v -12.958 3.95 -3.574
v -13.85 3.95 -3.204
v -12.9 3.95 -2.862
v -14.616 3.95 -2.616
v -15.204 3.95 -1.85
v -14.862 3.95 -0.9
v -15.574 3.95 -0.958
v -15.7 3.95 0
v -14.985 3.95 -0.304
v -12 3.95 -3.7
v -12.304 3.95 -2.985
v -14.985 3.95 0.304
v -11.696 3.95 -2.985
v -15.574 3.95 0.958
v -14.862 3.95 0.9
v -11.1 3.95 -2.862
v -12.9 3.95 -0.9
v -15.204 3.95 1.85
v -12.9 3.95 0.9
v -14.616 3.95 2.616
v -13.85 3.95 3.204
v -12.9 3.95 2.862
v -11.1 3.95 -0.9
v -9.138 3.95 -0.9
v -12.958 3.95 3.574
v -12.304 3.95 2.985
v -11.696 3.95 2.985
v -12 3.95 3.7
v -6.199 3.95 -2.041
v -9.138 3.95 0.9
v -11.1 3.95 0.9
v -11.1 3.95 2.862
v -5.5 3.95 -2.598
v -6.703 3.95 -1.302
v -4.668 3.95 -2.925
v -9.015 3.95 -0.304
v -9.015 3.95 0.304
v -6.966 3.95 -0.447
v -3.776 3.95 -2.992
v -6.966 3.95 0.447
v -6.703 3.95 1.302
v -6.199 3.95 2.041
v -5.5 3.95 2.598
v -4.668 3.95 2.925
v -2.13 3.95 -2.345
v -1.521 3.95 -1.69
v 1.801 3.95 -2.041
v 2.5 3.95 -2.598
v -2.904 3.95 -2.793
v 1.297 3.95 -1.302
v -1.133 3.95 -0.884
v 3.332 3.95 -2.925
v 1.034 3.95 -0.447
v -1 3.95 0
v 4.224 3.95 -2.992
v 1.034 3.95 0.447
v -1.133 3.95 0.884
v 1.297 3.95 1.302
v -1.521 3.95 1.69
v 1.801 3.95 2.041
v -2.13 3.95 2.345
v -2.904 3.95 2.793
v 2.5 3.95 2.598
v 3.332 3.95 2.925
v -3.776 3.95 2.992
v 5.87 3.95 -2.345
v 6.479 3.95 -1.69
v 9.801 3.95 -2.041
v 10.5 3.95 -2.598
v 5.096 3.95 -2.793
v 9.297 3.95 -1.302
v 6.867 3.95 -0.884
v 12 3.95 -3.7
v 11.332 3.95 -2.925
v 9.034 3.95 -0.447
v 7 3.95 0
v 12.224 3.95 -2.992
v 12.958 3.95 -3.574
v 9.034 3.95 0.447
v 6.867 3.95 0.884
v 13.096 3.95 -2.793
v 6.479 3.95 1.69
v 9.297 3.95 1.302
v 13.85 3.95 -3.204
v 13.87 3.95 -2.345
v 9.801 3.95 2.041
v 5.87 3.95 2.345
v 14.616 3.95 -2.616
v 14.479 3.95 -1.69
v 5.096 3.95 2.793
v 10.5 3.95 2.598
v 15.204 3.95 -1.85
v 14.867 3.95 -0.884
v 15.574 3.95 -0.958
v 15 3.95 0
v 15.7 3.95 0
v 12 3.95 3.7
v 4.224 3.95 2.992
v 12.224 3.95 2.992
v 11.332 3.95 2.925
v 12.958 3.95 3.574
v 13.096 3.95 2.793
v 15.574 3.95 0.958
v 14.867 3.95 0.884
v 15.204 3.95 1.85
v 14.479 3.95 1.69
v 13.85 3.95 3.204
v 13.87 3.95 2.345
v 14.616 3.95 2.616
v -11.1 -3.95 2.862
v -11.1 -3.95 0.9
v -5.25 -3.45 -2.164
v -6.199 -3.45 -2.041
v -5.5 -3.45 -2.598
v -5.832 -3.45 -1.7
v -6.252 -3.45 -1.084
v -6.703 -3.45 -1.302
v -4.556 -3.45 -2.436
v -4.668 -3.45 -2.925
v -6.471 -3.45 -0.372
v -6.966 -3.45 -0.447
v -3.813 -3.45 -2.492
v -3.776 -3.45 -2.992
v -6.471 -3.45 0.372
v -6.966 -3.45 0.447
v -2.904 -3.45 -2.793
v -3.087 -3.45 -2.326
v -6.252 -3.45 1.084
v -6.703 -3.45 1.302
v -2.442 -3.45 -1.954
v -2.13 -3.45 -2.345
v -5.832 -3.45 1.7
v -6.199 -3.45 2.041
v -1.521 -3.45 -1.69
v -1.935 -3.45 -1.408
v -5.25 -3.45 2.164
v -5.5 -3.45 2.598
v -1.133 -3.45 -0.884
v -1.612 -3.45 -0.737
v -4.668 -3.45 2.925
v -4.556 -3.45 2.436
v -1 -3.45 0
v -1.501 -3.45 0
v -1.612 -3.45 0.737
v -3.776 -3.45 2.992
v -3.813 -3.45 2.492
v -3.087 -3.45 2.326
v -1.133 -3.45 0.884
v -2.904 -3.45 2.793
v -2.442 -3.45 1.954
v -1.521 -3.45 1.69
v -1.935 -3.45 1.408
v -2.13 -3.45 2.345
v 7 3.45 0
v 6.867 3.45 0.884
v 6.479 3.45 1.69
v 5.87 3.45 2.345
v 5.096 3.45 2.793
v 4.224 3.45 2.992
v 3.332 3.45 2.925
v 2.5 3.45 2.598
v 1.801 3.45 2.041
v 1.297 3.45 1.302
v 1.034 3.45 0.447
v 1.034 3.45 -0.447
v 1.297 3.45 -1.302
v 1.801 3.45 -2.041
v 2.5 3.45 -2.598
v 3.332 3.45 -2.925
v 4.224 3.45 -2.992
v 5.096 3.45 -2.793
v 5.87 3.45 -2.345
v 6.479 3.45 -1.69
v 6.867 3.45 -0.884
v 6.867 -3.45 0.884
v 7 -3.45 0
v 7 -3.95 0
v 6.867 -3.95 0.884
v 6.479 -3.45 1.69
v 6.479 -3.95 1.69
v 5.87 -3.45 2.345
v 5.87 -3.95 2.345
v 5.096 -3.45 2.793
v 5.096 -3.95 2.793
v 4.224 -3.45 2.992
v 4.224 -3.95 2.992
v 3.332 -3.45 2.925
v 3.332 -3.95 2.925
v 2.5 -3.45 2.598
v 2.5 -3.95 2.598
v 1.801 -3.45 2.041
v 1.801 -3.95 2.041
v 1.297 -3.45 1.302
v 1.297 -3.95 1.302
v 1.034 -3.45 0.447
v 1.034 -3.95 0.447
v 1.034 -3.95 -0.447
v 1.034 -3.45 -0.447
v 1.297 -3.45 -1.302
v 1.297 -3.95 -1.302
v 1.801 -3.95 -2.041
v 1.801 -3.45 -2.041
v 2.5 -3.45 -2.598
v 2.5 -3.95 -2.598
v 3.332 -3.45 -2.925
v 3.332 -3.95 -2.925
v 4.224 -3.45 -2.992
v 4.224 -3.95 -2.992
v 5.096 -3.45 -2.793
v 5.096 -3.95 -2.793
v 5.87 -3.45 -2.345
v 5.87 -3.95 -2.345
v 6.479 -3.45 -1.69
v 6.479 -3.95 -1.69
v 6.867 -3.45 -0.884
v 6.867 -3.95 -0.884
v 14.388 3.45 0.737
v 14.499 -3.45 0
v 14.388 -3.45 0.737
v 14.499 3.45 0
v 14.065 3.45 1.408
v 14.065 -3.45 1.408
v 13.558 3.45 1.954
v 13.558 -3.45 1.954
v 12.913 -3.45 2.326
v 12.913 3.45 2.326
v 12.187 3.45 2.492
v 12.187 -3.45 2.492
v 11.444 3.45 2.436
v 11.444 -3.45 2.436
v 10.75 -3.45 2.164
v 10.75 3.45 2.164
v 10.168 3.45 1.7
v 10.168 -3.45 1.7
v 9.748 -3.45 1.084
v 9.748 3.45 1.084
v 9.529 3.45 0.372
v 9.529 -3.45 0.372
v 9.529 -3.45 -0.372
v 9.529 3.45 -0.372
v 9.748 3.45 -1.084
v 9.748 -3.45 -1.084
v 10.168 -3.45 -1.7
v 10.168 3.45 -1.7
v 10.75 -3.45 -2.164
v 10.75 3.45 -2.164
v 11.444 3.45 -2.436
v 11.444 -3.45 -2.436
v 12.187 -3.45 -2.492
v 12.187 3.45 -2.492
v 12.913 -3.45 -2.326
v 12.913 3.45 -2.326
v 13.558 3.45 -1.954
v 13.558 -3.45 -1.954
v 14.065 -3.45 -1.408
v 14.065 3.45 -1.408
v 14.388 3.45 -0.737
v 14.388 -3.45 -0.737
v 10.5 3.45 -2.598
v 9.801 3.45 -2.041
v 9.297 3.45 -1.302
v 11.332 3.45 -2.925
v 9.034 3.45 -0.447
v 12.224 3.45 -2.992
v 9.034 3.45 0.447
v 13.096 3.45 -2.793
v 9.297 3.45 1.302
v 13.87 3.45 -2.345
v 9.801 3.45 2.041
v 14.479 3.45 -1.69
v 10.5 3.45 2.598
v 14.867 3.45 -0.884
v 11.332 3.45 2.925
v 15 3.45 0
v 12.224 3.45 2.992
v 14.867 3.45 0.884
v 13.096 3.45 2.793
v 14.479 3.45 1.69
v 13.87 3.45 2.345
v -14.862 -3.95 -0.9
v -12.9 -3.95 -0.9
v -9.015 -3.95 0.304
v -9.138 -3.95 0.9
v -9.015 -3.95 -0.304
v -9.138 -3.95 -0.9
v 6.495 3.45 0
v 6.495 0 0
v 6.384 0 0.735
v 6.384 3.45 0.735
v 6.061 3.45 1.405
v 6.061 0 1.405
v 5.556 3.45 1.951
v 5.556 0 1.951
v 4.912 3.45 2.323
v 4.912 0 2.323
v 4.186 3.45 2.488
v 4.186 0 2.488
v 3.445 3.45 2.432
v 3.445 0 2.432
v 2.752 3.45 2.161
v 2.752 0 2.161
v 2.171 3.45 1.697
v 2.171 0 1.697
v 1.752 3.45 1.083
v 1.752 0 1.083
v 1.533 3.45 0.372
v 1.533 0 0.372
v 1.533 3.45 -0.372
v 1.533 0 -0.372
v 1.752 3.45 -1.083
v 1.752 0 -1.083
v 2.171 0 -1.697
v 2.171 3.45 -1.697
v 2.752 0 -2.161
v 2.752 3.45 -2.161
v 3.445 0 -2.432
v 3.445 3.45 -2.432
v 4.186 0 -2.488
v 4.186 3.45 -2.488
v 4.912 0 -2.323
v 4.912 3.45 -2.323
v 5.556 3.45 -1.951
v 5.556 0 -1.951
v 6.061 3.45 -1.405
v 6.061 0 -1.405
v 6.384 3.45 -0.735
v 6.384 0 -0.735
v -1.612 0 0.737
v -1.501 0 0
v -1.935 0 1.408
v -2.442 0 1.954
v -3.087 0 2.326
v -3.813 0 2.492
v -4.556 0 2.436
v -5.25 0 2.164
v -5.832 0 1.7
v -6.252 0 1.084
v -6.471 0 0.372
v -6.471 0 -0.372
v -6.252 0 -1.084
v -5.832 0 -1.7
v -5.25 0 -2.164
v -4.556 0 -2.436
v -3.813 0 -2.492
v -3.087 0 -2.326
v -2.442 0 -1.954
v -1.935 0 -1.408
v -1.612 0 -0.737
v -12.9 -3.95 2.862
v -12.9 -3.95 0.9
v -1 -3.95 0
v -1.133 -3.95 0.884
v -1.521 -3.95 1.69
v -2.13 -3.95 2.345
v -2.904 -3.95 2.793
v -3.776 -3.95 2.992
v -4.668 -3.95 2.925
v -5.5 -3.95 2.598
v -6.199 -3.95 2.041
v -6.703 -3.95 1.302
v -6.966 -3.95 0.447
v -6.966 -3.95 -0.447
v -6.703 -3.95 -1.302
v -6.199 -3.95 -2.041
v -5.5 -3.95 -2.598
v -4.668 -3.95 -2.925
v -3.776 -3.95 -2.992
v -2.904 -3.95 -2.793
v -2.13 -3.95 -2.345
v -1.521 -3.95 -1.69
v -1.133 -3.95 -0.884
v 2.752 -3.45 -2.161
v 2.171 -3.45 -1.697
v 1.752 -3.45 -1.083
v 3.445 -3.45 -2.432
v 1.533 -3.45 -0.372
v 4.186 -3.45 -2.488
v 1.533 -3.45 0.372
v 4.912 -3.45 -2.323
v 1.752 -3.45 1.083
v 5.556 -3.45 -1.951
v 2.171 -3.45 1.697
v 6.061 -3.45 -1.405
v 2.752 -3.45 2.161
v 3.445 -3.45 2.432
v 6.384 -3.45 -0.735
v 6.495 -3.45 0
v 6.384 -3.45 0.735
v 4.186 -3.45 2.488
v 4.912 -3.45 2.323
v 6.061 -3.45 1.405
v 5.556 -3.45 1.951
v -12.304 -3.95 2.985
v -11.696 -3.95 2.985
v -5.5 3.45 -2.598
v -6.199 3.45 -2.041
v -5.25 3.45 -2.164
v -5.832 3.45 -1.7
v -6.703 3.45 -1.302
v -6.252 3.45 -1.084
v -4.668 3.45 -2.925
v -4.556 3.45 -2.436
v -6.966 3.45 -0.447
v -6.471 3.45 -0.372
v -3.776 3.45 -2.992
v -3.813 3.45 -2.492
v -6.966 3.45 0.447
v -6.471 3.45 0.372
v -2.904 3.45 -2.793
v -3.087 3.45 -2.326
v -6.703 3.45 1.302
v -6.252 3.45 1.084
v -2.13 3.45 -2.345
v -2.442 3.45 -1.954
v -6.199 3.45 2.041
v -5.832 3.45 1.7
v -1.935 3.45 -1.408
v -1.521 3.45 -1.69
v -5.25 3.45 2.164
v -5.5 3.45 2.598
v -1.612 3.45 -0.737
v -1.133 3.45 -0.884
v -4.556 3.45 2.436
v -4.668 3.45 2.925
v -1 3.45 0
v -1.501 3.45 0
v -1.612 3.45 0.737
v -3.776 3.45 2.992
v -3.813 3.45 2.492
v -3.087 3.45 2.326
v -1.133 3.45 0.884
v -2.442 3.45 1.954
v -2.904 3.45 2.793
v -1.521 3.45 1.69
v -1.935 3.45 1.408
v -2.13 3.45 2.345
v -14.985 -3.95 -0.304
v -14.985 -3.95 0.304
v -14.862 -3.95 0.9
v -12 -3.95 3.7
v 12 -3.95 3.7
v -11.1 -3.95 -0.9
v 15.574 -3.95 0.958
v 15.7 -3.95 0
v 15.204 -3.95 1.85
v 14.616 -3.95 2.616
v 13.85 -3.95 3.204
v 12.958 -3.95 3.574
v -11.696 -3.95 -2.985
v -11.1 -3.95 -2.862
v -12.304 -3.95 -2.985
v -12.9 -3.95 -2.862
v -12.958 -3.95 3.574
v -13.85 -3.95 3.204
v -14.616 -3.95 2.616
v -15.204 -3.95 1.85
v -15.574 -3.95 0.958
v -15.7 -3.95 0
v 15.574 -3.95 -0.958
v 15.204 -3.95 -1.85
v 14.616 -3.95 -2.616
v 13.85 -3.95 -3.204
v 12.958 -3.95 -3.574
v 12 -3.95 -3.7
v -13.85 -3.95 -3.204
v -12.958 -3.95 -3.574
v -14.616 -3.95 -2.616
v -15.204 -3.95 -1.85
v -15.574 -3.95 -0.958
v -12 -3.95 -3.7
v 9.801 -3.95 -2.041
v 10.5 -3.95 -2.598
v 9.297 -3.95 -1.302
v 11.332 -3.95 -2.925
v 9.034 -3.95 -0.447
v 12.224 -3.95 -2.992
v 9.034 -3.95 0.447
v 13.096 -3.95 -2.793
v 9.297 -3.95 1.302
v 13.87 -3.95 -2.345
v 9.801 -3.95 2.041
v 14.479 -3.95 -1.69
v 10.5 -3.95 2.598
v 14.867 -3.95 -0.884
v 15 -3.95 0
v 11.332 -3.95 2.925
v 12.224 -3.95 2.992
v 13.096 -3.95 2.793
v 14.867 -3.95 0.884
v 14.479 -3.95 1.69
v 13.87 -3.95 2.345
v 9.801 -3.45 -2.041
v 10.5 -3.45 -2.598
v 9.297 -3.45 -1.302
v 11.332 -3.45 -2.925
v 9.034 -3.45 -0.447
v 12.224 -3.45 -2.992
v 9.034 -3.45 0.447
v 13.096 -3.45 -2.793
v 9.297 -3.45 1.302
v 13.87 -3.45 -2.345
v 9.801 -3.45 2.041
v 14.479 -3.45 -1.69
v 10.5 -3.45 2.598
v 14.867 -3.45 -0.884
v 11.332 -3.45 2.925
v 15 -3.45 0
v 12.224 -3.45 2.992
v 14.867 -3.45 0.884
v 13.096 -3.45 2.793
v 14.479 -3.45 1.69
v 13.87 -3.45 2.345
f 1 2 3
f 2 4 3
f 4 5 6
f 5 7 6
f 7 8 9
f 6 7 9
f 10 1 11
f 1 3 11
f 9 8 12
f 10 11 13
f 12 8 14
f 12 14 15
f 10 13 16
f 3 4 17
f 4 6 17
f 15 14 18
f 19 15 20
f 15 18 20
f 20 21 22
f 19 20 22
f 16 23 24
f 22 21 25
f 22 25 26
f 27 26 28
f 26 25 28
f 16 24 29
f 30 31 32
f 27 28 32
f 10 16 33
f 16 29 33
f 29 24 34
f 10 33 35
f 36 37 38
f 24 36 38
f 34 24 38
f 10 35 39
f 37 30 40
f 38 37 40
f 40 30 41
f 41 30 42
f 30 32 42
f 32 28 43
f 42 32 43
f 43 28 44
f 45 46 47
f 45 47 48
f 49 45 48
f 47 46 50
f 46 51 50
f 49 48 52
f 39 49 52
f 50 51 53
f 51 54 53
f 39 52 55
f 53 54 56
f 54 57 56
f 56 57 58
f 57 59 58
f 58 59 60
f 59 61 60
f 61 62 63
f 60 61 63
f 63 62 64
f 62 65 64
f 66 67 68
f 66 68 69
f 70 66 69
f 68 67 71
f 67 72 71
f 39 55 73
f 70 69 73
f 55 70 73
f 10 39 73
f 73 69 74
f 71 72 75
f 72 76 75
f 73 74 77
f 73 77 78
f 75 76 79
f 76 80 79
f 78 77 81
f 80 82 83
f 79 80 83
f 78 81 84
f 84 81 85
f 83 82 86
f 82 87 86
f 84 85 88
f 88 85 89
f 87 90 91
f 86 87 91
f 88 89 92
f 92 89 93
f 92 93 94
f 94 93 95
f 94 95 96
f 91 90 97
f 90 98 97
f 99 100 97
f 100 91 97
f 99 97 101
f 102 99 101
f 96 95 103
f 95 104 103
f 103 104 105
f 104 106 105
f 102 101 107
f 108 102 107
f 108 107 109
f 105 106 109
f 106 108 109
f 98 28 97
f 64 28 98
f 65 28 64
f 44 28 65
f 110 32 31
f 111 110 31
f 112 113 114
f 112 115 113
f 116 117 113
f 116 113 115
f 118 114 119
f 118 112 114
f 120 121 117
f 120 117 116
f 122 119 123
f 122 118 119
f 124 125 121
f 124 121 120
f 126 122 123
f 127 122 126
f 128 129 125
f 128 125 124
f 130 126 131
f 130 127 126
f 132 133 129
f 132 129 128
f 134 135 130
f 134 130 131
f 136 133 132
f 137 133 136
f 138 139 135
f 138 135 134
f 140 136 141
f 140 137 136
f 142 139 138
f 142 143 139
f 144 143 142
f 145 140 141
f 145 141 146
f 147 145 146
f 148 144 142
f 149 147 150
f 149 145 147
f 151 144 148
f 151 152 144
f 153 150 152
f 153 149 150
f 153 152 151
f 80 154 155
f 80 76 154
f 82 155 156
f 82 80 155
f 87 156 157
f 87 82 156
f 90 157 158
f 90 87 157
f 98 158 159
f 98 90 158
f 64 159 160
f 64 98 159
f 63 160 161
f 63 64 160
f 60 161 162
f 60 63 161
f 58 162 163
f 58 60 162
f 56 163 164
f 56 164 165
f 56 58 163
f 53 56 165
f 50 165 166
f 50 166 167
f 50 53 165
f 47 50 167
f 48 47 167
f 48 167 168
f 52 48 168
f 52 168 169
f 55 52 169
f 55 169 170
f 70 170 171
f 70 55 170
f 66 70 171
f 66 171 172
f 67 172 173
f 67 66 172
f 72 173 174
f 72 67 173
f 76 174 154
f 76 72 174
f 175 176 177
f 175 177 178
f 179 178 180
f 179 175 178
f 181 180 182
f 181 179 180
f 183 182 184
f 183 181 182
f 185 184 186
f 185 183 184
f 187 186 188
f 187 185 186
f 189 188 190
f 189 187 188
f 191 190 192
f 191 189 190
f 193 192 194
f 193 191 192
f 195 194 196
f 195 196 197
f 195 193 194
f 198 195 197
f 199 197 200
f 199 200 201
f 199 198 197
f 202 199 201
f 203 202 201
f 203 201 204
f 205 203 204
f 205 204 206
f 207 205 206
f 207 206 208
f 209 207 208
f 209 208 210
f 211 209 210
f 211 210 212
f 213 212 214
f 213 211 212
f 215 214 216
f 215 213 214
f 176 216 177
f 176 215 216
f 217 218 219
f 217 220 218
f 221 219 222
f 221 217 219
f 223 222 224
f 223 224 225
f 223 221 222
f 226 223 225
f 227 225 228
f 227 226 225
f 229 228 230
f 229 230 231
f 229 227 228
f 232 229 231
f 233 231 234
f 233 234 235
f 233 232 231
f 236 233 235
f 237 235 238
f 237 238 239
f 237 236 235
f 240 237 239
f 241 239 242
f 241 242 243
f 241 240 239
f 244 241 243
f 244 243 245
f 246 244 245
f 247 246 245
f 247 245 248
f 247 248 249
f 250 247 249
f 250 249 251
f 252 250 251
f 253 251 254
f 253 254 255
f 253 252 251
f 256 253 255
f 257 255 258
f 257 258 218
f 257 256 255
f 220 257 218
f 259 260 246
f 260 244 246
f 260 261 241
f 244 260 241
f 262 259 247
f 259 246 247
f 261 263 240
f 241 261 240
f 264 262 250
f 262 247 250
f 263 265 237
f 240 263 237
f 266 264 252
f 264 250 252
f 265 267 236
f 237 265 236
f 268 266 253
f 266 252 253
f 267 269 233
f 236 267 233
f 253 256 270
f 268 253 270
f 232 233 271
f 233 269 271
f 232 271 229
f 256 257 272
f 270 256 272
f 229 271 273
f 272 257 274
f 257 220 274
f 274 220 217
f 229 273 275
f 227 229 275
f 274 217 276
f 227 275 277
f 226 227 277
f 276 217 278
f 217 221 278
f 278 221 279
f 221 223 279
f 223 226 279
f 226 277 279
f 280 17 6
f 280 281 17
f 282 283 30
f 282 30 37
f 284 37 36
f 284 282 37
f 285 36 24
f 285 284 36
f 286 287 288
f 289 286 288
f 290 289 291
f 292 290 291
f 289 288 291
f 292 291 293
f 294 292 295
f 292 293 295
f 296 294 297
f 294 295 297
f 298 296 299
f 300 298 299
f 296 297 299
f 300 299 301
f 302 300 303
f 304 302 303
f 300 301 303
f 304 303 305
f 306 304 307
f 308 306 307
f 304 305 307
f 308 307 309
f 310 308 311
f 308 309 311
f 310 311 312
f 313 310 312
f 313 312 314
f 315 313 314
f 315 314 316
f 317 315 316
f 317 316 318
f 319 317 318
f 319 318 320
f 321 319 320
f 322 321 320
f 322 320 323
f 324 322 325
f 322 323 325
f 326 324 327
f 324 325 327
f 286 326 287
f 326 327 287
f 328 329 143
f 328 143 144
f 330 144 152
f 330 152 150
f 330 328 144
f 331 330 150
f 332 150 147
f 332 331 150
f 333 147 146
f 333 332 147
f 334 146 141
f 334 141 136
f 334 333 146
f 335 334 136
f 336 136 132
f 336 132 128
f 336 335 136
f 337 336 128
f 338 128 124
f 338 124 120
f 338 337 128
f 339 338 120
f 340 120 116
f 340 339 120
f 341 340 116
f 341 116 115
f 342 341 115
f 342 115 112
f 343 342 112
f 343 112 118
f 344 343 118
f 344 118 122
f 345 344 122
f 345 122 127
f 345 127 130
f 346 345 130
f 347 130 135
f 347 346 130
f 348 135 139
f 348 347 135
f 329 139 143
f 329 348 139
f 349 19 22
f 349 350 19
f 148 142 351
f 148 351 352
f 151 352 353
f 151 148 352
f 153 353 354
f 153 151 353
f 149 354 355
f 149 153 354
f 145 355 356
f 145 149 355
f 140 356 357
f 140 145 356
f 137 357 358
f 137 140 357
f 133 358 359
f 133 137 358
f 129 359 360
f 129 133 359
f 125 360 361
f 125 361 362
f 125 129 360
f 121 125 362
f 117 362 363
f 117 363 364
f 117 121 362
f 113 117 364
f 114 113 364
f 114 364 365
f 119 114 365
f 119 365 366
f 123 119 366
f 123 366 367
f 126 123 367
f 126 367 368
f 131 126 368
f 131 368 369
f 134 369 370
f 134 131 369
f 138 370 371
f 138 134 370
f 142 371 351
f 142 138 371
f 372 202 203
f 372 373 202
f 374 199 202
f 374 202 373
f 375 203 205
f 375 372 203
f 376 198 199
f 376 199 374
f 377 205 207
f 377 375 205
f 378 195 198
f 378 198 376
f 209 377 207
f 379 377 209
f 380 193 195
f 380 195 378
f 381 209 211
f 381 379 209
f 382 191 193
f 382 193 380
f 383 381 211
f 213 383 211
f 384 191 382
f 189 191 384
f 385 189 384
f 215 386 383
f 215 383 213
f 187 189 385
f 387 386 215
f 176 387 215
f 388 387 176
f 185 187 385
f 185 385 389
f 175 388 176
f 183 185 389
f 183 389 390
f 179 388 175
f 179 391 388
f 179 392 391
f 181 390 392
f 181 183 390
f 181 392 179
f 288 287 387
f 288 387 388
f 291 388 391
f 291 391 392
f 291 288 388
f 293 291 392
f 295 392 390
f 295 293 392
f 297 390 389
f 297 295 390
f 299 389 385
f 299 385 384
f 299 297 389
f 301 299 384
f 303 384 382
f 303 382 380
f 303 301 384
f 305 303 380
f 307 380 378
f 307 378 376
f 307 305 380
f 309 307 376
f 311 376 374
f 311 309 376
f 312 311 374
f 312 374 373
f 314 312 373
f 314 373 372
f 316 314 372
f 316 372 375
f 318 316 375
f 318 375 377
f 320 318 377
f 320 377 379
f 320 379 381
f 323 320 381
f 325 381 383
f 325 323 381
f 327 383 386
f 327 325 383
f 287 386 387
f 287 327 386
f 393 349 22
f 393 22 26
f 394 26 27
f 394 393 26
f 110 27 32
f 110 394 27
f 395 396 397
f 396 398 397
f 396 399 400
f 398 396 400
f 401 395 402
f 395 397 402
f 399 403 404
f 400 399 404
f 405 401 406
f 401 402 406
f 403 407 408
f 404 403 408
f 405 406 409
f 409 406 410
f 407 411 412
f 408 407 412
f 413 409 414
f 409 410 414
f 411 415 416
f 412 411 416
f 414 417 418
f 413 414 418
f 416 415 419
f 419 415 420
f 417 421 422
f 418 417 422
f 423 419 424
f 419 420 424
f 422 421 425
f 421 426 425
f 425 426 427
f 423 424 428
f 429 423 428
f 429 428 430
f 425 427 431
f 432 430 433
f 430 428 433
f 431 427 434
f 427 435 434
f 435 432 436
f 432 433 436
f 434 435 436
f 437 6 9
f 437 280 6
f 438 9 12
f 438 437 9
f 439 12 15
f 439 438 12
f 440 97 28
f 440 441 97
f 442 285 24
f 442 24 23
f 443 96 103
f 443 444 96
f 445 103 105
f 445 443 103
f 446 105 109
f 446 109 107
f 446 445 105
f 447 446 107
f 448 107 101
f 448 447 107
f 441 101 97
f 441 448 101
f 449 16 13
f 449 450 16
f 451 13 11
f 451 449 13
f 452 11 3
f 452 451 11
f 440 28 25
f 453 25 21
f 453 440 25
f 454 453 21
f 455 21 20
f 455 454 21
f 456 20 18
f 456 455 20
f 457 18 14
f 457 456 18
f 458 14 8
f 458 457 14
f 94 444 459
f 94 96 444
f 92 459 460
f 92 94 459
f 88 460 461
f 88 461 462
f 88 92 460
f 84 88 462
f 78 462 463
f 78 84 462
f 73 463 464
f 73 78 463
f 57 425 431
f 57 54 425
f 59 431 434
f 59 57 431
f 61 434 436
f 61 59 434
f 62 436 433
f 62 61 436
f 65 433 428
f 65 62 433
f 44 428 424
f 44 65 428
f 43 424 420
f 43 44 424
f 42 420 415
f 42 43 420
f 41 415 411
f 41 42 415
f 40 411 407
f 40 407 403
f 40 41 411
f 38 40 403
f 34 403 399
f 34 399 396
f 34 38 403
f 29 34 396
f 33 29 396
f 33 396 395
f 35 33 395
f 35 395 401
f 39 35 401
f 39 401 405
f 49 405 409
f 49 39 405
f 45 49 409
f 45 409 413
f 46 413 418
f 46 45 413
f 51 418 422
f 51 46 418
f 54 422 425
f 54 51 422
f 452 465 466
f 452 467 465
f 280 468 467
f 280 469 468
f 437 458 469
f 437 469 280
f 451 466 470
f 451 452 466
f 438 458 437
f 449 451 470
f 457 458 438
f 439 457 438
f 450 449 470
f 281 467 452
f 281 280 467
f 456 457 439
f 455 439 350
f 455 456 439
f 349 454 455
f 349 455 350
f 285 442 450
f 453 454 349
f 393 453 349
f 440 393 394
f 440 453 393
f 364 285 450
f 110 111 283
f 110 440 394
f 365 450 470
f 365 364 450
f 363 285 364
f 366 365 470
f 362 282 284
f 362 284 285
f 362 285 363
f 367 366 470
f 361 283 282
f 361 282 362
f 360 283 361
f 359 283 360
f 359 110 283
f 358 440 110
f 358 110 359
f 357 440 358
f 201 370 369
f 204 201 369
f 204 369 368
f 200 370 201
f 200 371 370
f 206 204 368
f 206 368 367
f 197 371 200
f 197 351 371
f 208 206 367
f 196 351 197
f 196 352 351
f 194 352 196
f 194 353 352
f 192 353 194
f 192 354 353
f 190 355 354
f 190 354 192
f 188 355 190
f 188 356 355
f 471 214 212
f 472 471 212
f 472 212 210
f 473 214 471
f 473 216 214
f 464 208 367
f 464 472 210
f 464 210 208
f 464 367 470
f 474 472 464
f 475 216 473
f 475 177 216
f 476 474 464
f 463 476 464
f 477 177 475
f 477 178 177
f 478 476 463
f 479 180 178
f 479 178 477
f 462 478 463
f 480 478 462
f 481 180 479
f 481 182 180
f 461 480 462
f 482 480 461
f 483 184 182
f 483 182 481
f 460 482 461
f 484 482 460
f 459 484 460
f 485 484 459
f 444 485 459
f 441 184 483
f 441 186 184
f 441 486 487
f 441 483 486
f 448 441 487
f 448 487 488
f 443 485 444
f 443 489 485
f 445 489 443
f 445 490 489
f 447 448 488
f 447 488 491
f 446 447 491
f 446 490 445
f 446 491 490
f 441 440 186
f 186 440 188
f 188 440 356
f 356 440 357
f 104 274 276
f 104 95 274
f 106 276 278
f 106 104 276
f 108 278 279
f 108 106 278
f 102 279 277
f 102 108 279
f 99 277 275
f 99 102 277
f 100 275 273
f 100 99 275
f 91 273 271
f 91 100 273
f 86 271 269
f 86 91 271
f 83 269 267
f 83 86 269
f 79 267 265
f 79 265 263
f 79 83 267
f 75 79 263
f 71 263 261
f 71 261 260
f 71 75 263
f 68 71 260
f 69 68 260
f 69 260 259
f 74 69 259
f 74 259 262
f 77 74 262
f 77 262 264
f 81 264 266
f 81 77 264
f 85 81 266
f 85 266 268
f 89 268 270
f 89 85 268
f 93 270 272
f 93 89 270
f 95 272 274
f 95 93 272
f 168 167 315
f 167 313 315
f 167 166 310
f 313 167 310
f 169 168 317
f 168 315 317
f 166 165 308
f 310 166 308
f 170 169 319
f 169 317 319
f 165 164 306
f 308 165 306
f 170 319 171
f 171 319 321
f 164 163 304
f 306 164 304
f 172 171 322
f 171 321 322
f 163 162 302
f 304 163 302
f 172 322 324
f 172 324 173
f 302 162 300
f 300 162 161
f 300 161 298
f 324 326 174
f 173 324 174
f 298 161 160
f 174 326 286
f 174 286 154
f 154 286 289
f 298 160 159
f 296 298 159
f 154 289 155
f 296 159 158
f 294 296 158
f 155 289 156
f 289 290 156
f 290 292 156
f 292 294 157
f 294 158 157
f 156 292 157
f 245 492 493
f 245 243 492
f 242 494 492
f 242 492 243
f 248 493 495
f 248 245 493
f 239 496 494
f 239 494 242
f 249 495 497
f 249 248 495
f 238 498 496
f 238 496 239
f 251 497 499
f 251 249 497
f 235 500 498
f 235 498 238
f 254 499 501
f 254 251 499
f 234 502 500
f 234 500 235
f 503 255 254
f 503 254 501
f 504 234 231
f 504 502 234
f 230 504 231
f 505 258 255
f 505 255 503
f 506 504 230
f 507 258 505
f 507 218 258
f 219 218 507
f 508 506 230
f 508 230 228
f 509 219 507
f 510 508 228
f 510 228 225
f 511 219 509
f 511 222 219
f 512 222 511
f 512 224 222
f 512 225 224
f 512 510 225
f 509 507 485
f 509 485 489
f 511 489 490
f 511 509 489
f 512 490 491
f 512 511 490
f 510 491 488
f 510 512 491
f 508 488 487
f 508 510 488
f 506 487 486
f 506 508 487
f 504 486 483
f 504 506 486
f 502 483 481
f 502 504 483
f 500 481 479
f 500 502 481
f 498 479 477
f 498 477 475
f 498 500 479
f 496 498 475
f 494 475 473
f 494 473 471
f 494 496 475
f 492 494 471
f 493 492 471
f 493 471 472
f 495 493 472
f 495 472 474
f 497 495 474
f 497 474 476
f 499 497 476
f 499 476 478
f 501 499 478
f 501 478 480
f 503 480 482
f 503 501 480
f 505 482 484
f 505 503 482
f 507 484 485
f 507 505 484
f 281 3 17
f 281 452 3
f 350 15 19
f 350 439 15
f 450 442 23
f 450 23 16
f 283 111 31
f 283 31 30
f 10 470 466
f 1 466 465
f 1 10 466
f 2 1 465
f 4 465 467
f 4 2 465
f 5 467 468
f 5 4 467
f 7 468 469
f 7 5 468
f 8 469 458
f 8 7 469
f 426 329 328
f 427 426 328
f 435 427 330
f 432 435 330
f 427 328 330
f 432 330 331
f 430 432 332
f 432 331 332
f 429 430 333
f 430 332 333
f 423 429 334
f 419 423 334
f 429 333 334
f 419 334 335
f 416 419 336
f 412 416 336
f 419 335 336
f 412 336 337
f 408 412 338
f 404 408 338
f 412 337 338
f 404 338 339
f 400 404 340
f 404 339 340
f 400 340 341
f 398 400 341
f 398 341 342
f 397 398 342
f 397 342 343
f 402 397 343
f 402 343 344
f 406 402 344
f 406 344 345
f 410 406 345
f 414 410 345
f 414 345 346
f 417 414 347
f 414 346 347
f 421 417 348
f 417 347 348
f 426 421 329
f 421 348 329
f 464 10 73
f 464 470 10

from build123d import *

# Parameters (mm, degrees)
F0_R     = 3
F1_DEPTH = 3.95
F0_R_2   = 2.499
F0_R_3   = 2.495
F2_DEPTH = 3.45
F3_R     = 3.69999


# Not quite as in the source:
# - a fillet or chamfer is up to 0.001 mm smaller than in the source, because OpenCascade refuses the exact size


with BuildPart() as f1:
    # F0 (on Front) → F1 (new body, symmetric)
    with BuildSketch(Plane.XZ):
        Polygon((15.7, -3.7), (15.7, 0), (15.7, 3.7), (-15.7, 3.7), (-15.7, -3.7), align=None)
        with BuildLine():
            ThreePointArc((-12.8998169675, 2.8618751589), (-11.9998409744, 2.9999999958), (-11.0998796299, 2.8617797468))
            Line((-11.0998796299, 2.8617797468), (-11.0998796299, 0.8996879915))
            Line((-11.0998796299, 0.8996879915), (-9.1380842923, 0.8996879915))
            ThreePointArc((-9.1380842923, 0.8996879915), (-9.0000000001, -2.51387e-05), (-9.1380993707, -0.8997359546))
            Line((-9.1380993707, -0.8997359546), (-11.0998796299, -0.8997359546))
            Line((-11.0998796299, -0.8997359546), (-11.0998796299, -2.8617797468))
            ThreePointArc((-11.0998796299, -2.8617797468), (-11.9998409744, -2.9999999958), (-12.8998169675, -2.8618751589))
            Line((-12.8998169675, -2.8618751589), (-12.8998169675, -0.8997359546))
            Line((-12.8998169675, -0.8997359546), (-14.8619006293, -0.8997359546))
            ThreePointArc((-14.8619006293, -0.8997359546), (-14.9999999999, -2.51387e-05), (-14.8619157077, 0.8996879915))
            Line((-14.8619157077, 0.8996879915), (-12.8998169675, 0.8996879915))
            Line((-12.8998169675, 0.8996879915), (-12.8998169675, 2.8618751589))
        make_face(mode=Mode.SUBTRACT)
        with Locations((-4, 0)):
            Circle(F0_R, mode=Mode.SUBTRACT)
        with Locations((4, 0)):
            Circle(F0_R, mode=Mode.SUBTRACT)
        with Locations((12, 0)):
            Circle(F0_R, mode=Mode.SUBTRACT)
    extrude(amount=F1_DEPTH, both=True)

    # F0 (on Front) → F2 (join, symmetric)
    with BuildSketch(Plane.XZ):
        with Locations((-4, 0)):
            Circle(F0_R)
        with Locations((-4, 0)):
            Circle(F0_R_2, mode=Mode.SUBTRACT)
        with Locations((4, 0)):
            Circle(F0_R)
        with Locations((4, 0)):
            Circle(F0_R_3, mode=Mode.SUBTRACT)
        with Locations((12, 0)):
            Circle(F0_R)
        with Locations((12, 0)):
            Circle(F0_R_2, mode=Mode.SUBTRACT)
    extrude(amount=F2_DEPTH, both=True)

    # F3 (radius 3.7 in the source; OpenCascade refuses exactly that, so slightly less here)
    f3_edges = [f1.edges().sort_by_distance(p)[0] for p in [
        (-15.7, 0, 3.7),
        (-15.7, 0, -3.7),
        (15.7, 0, 3.7),
        (15.7, 0, -3.7),
    ]]
    fillet(f3_edges, radius=F3_R)


solid = f1.part
